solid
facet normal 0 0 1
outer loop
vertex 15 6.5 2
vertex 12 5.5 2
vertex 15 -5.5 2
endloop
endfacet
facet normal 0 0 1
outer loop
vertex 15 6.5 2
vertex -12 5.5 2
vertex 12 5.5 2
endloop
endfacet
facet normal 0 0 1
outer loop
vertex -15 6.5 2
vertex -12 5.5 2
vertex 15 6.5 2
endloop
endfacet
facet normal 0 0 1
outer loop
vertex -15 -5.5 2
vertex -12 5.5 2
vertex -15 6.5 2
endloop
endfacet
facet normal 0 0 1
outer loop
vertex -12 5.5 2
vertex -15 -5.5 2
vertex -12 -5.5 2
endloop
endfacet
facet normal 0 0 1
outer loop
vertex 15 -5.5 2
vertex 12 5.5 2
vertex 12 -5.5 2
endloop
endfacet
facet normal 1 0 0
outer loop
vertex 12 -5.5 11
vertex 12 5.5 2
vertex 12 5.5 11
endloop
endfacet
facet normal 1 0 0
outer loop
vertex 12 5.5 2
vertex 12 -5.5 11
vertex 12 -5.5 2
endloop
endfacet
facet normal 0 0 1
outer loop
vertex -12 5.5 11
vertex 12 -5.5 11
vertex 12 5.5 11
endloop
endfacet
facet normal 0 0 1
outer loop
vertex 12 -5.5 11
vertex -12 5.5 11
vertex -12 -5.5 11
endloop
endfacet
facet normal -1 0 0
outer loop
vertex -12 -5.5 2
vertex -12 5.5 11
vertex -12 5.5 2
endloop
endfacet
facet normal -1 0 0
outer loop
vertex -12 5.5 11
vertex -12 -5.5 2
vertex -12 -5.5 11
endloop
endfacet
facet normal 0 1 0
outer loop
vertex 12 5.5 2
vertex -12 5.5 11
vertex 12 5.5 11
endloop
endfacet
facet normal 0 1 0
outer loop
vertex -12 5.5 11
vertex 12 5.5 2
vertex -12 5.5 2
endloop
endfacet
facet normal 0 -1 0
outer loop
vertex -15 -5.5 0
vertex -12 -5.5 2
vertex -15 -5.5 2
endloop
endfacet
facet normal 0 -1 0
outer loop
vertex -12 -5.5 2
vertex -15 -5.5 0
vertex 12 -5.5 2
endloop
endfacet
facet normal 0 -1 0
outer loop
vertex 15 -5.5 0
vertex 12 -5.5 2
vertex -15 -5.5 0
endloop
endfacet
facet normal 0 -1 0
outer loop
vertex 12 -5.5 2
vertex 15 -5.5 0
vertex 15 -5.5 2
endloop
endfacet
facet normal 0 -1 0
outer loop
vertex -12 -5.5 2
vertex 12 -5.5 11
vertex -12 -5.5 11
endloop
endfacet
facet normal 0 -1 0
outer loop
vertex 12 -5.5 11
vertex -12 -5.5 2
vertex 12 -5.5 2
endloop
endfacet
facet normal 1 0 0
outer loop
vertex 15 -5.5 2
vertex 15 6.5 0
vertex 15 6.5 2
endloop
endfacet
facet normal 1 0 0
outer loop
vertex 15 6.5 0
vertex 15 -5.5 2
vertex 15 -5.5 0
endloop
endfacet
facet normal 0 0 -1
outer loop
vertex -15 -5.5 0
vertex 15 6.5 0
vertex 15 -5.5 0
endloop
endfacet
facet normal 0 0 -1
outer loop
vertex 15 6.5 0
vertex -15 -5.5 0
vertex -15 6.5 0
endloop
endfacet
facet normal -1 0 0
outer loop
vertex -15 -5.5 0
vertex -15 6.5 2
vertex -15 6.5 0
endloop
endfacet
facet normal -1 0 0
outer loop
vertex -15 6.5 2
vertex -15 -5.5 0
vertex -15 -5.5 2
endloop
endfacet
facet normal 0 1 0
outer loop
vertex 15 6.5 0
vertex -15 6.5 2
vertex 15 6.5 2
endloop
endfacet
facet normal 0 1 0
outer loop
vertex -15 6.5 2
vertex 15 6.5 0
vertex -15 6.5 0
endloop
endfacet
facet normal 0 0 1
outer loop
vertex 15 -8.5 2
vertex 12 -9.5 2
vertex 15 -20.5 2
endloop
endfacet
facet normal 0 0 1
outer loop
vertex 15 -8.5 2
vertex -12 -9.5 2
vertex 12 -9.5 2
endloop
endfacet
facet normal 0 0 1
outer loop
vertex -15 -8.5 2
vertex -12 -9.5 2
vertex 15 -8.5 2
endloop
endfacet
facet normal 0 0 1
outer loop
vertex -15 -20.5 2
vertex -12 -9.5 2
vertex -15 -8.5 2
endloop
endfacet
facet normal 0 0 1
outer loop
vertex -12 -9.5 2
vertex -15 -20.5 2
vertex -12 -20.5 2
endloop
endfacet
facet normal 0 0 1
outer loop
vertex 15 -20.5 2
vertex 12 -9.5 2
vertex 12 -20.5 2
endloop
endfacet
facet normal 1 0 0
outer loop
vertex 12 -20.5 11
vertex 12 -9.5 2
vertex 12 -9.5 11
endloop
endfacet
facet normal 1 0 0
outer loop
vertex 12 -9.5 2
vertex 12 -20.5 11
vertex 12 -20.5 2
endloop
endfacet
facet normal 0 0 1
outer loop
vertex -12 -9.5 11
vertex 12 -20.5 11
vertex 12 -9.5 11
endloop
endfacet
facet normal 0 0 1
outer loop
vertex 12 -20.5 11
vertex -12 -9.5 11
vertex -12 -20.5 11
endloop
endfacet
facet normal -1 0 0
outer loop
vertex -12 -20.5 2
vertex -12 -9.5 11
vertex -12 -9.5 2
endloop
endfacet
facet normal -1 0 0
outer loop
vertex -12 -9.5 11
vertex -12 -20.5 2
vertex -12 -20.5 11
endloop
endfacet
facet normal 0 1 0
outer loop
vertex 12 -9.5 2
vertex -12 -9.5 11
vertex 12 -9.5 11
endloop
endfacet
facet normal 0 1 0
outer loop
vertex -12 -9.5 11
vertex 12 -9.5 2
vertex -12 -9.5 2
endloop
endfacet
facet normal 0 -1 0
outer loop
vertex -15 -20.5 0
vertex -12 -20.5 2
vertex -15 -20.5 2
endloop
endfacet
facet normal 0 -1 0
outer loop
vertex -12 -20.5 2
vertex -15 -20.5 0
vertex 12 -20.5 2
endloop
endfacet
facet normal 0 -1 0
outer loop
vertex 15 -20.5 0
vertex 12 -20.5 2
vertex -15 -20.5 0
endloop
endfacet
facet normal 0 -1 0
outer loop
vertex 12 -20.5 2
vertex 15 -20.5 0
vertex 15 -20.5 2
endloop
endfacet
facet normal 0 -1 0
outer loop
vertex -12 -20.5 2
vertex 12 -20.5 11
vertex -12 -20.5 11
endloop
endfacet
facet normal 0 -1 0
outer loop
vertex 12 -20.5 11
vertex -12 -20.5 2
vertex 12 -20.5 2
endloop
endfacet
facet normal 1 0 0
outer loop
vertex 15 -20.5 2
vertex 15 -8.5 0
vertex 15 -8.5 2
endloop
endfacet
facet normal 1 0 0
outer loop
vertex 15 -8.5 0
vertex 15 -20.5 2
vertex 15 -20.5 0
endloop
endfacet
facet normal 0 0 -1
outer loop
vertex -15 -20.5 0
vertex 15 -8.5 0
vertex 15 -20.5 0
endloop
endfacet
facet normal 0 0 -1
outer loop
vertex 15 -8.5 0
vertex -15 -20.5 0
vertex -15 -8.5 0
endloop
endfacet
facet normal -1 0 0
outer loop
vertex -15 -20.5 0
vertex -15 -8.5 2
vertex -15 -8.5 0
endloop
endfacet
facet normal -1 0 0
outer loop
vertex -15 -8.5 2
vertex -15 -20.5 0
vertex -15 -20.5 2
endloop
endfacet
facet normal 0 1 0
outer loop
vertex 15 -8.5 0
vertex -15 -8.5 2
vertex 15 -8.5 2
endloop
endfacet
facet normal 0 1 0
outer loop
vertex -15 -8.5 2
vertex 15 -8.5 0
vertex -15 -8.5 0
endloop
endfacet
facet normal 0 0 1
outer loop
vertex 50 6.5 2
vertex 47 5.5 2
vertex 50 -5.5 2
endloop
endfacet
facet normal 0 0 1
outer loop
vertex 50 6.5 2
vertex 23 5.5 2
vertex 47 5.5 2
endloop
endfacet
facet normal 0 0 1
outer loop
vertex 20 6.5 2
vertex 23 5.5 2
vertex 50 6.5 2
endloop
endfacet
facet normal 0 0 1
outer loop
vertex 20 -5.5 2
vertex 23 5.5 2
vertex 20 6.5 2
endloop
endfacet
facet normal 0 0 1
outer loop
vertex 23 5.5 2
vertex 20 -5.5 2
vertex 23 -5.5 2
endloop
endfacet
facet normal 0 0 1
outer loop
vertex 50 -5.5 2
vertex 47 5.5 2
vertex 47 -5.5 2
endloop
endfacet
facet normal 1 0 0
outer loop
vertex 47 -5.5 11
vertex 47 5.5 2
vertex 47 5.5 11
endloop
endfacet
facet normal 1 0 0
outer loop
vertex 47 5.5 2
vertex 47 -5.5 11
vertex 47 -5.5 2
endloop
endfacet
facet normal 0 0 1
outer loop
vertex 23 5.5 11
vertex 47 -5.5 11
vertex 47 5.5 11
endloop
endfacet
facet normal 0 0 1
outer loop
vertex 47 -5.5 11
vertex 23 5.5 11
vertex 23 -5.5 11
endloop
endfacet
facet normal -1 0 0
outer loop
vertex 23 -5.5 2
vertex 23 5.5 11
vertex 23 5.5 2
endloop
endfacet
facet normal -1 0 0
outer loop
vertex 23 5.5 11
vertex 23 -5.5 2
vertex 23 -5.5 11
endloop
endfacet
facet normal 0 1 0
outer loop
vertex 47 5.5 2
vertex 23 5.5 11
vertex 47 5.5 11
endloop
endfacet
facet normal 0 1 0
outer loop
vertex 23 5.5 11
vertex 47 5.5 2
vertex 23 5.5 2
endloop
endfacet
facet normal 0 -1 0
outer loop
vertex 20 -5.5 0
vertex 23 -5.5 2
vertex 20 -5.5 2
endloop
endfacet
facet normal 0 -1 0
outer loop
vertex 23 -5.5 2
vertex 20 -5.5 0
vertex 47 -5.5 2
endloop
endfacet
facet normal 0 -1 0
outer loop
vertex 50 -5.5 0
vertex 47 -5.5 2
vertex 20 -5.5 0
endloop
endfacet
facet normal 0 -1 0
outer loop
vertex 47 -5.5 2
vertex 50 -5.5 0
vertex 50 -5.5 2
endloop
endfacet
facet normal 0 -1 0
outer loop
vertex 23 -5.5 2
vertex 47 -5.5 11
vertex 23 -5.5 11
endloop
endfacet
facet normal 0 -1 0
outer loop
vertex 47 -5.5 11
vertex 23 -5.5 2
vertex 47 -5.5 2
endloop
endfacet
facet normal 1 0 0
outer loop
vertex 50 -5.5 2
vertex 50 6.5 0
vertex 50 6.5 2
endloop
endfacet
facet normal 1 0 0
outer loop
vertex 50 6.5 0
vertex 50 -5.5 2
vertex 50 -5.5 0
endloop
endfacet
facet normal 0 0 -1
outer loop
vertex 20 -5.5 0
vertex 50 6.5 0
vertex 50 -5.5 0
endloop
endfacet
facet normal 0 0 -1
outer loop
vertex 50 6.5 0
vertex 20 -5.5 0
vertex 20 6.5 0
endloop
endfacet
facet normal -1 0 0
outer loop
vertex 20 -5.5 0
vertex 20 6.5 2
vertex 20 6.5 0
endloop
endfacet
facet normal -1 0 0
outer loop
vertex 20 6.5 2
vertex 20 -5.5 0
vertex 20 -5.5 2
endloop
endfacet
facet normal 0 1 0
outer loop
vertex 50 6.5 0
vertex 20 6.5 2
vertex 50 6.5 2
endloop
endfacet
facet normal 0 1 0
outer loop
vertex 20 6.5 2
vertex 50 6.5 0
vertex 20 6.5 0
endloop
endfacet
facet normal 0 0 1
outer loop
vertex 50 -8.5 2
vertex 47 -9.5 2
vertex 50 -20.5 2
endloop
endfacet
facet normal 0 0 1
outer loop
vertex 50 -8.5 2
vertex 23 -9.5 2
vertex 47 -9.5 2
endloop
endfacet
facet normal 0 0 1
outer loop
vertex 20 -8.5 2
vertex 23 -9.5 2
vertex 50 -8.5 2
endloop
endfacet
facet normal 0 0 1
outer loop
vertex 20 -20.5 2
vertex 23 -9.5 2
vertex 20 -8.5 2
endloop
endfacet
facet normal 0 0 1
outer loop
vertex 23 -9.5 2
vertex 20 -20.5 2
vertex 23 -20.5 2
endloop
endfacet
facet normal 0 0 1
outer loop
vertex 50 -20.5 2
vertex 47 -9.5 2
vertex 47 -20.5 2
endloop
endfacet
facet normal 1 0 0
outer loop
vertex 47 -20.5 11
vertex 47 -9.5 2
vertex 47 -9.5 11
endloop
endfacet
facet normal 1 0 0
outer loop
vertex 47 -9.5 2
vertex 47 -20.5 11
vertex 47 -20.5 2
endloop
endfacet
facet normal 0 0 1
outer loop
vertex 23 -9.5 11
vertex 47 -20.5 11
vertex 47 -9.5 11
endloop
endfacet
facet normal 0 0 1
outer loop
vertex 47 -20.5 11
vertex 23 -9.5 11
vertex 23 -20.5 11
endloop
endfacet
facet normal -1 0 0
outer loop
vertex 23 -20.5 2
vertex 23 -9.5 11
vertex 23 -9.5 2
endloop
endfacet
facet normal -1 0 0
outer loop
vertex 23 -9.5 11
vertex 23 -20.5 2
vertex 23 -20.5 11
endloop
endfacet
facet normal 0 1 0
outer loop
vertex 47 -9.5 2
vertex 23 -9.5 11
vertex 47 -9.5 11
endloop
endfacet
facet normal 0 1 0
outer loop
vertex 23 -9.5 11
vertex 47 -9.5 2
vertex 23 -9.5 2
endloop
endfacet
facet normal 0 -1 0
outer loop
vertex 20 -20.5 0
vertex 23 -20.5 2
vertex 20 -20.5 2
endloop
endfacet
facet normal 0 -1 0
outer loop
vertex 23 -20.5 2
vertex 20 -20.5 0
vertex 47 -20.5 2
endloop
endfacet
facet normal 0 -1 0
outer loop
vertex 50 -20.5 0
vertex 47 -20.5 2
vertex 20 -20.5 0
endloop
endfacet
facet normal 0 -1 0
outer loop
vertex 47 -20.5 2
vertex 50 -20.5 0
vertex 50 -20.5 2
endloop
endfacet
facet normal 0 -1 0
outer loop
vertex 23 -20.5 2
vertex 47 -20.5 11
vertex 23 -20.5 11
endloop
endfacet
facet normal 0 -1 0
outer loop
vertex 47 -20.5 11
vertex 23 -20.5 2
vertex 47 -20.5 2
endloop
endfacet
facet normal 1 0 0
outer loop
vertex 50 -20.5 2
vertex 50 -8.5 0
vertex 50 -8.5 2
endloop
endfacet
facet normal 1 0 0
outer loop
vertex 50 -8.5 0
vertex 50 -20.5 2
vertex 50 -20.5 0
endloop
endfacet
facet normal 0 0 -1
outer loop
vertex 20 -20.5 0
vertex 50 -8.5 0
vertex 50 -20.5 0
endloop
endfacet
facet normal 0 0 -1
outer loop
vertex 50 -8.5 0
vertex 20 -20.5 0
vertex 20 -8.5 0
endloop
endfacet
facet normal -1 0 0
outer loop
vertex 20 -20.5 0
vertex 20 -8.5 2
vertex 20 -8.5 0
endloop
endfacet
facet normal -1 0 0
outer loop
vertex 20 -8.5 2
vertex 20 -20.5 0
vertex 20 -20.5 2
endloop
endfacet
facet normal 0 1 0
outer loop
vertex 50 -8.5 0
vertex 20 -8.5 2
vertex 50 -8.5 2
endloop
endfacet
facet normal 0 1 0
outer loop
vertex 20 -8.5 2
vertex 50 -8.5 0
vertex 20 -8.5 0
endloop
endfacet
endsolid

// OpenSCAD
// file: ../display.scad
/**
 * Available displays:
 * 
 * Seed Technology:
 * + http://media.digikey.com/pdf/Data%20Sheets/Seeed%20Technology/114990163_Web.pdf
 */

//display("seedVoltMeterGreen");
//display("seedVoltMeterYellow");
//display("seedVoltMeterRed");

module display(type, displayColor="white", holes=true) {
  if(type == "seedVoltMeterGreen")
    seedVoltMeter(displayColor, "green", holes);

  if(type == "seedVoltMeterYellow")
    seedVoltMeter(displayColor, "yellow", holes);

  if(type == "seedVoltMeterRed")
    seedVoltMeter(displayColor, "red", holes);

  if(type == "seedVoltMeterBlue")
    seedVoltMeter(displayColor, "blue", holes);
}

module seedVoltMeter(displayColor="white", ledColor="green", holes=true) {
  displayLength = 24;
  displayWidth = 11;
  displayHeight = (holes) ? 9 : 10;

  boardLength = 30;
  boardWidth = 12;
  boardHeight = 2;

  padding = (boardLength - displayLength) / 2;

  segmentLength = 8;
  paddingSegment = 2.2;
  segmentWidth = (displayLength - paddingSegment * 4) / 3;

  segments = [
    [padding + 1.5, 1.5, boardHeight],
    [padding + segmentWidth + paddingSegment * 2, 1.5, boardHeight],
    [padding + (segmentWidth + paddingSegment) * 2 + paddingSegment, 1.5, boardHeight]
  ];

  translate([-boardLength / 2, -displayWidth / 2, 0]) {
    color(displayColor)
      group() {
        cube([boardLength, boardWidth, boardHeight]);

        difference() {
          translate([padding, 0, boardHeight])
            cube([displayLength, displayWidth, displayHeight]);

          if(holes)
            for(pos=segments)
              translate(pos)
                segment(displayHeight + 1);
        }
      }

      if(holes)
        for(pos=segments)
          translate(pos)
            color(ledColor)
              segment(displayHeight);
  }

  module segment(height, color="white") {
    length = segmentWidth - 2;
    width = 0.5;
    horizontal = [
      [1, 0, 0],
      [1, (segmentLength - width) / 2, 0],
      [1, segmentLength - width, 0]
    ];

    vertical = [
      [0, width, 0],
      [segmentWidth - width, width, 0],
      [0, width + (segmentLength - width * 3) / 2 +width, 0],
      [segmentWidth - width, width + (segmentLength - width * 3) / 2 +width, 0]
    ];

    group() {
      for(pos=horizontal)
        translate(pos)
          cube([length, width, height]);

      for(pos=vertical)
        translate(pos)
          cube([width, (segmentLength - width * 3) / 2, height]);

      translate([segmentWidth + width * 1.5, 0, 0])
        cube([width, width, height]);
    }
  }
}
// main file
include <../display.scad>;

display("seedVoltMeterGreen");

translate([0, -15, 0])
  display("seedVoltMeterYellow");

translate([35, 0, 0])
  display("seedVoltMeterRed");

translate([35, -15, 0])
  display("seedVoltMeterBlue");
